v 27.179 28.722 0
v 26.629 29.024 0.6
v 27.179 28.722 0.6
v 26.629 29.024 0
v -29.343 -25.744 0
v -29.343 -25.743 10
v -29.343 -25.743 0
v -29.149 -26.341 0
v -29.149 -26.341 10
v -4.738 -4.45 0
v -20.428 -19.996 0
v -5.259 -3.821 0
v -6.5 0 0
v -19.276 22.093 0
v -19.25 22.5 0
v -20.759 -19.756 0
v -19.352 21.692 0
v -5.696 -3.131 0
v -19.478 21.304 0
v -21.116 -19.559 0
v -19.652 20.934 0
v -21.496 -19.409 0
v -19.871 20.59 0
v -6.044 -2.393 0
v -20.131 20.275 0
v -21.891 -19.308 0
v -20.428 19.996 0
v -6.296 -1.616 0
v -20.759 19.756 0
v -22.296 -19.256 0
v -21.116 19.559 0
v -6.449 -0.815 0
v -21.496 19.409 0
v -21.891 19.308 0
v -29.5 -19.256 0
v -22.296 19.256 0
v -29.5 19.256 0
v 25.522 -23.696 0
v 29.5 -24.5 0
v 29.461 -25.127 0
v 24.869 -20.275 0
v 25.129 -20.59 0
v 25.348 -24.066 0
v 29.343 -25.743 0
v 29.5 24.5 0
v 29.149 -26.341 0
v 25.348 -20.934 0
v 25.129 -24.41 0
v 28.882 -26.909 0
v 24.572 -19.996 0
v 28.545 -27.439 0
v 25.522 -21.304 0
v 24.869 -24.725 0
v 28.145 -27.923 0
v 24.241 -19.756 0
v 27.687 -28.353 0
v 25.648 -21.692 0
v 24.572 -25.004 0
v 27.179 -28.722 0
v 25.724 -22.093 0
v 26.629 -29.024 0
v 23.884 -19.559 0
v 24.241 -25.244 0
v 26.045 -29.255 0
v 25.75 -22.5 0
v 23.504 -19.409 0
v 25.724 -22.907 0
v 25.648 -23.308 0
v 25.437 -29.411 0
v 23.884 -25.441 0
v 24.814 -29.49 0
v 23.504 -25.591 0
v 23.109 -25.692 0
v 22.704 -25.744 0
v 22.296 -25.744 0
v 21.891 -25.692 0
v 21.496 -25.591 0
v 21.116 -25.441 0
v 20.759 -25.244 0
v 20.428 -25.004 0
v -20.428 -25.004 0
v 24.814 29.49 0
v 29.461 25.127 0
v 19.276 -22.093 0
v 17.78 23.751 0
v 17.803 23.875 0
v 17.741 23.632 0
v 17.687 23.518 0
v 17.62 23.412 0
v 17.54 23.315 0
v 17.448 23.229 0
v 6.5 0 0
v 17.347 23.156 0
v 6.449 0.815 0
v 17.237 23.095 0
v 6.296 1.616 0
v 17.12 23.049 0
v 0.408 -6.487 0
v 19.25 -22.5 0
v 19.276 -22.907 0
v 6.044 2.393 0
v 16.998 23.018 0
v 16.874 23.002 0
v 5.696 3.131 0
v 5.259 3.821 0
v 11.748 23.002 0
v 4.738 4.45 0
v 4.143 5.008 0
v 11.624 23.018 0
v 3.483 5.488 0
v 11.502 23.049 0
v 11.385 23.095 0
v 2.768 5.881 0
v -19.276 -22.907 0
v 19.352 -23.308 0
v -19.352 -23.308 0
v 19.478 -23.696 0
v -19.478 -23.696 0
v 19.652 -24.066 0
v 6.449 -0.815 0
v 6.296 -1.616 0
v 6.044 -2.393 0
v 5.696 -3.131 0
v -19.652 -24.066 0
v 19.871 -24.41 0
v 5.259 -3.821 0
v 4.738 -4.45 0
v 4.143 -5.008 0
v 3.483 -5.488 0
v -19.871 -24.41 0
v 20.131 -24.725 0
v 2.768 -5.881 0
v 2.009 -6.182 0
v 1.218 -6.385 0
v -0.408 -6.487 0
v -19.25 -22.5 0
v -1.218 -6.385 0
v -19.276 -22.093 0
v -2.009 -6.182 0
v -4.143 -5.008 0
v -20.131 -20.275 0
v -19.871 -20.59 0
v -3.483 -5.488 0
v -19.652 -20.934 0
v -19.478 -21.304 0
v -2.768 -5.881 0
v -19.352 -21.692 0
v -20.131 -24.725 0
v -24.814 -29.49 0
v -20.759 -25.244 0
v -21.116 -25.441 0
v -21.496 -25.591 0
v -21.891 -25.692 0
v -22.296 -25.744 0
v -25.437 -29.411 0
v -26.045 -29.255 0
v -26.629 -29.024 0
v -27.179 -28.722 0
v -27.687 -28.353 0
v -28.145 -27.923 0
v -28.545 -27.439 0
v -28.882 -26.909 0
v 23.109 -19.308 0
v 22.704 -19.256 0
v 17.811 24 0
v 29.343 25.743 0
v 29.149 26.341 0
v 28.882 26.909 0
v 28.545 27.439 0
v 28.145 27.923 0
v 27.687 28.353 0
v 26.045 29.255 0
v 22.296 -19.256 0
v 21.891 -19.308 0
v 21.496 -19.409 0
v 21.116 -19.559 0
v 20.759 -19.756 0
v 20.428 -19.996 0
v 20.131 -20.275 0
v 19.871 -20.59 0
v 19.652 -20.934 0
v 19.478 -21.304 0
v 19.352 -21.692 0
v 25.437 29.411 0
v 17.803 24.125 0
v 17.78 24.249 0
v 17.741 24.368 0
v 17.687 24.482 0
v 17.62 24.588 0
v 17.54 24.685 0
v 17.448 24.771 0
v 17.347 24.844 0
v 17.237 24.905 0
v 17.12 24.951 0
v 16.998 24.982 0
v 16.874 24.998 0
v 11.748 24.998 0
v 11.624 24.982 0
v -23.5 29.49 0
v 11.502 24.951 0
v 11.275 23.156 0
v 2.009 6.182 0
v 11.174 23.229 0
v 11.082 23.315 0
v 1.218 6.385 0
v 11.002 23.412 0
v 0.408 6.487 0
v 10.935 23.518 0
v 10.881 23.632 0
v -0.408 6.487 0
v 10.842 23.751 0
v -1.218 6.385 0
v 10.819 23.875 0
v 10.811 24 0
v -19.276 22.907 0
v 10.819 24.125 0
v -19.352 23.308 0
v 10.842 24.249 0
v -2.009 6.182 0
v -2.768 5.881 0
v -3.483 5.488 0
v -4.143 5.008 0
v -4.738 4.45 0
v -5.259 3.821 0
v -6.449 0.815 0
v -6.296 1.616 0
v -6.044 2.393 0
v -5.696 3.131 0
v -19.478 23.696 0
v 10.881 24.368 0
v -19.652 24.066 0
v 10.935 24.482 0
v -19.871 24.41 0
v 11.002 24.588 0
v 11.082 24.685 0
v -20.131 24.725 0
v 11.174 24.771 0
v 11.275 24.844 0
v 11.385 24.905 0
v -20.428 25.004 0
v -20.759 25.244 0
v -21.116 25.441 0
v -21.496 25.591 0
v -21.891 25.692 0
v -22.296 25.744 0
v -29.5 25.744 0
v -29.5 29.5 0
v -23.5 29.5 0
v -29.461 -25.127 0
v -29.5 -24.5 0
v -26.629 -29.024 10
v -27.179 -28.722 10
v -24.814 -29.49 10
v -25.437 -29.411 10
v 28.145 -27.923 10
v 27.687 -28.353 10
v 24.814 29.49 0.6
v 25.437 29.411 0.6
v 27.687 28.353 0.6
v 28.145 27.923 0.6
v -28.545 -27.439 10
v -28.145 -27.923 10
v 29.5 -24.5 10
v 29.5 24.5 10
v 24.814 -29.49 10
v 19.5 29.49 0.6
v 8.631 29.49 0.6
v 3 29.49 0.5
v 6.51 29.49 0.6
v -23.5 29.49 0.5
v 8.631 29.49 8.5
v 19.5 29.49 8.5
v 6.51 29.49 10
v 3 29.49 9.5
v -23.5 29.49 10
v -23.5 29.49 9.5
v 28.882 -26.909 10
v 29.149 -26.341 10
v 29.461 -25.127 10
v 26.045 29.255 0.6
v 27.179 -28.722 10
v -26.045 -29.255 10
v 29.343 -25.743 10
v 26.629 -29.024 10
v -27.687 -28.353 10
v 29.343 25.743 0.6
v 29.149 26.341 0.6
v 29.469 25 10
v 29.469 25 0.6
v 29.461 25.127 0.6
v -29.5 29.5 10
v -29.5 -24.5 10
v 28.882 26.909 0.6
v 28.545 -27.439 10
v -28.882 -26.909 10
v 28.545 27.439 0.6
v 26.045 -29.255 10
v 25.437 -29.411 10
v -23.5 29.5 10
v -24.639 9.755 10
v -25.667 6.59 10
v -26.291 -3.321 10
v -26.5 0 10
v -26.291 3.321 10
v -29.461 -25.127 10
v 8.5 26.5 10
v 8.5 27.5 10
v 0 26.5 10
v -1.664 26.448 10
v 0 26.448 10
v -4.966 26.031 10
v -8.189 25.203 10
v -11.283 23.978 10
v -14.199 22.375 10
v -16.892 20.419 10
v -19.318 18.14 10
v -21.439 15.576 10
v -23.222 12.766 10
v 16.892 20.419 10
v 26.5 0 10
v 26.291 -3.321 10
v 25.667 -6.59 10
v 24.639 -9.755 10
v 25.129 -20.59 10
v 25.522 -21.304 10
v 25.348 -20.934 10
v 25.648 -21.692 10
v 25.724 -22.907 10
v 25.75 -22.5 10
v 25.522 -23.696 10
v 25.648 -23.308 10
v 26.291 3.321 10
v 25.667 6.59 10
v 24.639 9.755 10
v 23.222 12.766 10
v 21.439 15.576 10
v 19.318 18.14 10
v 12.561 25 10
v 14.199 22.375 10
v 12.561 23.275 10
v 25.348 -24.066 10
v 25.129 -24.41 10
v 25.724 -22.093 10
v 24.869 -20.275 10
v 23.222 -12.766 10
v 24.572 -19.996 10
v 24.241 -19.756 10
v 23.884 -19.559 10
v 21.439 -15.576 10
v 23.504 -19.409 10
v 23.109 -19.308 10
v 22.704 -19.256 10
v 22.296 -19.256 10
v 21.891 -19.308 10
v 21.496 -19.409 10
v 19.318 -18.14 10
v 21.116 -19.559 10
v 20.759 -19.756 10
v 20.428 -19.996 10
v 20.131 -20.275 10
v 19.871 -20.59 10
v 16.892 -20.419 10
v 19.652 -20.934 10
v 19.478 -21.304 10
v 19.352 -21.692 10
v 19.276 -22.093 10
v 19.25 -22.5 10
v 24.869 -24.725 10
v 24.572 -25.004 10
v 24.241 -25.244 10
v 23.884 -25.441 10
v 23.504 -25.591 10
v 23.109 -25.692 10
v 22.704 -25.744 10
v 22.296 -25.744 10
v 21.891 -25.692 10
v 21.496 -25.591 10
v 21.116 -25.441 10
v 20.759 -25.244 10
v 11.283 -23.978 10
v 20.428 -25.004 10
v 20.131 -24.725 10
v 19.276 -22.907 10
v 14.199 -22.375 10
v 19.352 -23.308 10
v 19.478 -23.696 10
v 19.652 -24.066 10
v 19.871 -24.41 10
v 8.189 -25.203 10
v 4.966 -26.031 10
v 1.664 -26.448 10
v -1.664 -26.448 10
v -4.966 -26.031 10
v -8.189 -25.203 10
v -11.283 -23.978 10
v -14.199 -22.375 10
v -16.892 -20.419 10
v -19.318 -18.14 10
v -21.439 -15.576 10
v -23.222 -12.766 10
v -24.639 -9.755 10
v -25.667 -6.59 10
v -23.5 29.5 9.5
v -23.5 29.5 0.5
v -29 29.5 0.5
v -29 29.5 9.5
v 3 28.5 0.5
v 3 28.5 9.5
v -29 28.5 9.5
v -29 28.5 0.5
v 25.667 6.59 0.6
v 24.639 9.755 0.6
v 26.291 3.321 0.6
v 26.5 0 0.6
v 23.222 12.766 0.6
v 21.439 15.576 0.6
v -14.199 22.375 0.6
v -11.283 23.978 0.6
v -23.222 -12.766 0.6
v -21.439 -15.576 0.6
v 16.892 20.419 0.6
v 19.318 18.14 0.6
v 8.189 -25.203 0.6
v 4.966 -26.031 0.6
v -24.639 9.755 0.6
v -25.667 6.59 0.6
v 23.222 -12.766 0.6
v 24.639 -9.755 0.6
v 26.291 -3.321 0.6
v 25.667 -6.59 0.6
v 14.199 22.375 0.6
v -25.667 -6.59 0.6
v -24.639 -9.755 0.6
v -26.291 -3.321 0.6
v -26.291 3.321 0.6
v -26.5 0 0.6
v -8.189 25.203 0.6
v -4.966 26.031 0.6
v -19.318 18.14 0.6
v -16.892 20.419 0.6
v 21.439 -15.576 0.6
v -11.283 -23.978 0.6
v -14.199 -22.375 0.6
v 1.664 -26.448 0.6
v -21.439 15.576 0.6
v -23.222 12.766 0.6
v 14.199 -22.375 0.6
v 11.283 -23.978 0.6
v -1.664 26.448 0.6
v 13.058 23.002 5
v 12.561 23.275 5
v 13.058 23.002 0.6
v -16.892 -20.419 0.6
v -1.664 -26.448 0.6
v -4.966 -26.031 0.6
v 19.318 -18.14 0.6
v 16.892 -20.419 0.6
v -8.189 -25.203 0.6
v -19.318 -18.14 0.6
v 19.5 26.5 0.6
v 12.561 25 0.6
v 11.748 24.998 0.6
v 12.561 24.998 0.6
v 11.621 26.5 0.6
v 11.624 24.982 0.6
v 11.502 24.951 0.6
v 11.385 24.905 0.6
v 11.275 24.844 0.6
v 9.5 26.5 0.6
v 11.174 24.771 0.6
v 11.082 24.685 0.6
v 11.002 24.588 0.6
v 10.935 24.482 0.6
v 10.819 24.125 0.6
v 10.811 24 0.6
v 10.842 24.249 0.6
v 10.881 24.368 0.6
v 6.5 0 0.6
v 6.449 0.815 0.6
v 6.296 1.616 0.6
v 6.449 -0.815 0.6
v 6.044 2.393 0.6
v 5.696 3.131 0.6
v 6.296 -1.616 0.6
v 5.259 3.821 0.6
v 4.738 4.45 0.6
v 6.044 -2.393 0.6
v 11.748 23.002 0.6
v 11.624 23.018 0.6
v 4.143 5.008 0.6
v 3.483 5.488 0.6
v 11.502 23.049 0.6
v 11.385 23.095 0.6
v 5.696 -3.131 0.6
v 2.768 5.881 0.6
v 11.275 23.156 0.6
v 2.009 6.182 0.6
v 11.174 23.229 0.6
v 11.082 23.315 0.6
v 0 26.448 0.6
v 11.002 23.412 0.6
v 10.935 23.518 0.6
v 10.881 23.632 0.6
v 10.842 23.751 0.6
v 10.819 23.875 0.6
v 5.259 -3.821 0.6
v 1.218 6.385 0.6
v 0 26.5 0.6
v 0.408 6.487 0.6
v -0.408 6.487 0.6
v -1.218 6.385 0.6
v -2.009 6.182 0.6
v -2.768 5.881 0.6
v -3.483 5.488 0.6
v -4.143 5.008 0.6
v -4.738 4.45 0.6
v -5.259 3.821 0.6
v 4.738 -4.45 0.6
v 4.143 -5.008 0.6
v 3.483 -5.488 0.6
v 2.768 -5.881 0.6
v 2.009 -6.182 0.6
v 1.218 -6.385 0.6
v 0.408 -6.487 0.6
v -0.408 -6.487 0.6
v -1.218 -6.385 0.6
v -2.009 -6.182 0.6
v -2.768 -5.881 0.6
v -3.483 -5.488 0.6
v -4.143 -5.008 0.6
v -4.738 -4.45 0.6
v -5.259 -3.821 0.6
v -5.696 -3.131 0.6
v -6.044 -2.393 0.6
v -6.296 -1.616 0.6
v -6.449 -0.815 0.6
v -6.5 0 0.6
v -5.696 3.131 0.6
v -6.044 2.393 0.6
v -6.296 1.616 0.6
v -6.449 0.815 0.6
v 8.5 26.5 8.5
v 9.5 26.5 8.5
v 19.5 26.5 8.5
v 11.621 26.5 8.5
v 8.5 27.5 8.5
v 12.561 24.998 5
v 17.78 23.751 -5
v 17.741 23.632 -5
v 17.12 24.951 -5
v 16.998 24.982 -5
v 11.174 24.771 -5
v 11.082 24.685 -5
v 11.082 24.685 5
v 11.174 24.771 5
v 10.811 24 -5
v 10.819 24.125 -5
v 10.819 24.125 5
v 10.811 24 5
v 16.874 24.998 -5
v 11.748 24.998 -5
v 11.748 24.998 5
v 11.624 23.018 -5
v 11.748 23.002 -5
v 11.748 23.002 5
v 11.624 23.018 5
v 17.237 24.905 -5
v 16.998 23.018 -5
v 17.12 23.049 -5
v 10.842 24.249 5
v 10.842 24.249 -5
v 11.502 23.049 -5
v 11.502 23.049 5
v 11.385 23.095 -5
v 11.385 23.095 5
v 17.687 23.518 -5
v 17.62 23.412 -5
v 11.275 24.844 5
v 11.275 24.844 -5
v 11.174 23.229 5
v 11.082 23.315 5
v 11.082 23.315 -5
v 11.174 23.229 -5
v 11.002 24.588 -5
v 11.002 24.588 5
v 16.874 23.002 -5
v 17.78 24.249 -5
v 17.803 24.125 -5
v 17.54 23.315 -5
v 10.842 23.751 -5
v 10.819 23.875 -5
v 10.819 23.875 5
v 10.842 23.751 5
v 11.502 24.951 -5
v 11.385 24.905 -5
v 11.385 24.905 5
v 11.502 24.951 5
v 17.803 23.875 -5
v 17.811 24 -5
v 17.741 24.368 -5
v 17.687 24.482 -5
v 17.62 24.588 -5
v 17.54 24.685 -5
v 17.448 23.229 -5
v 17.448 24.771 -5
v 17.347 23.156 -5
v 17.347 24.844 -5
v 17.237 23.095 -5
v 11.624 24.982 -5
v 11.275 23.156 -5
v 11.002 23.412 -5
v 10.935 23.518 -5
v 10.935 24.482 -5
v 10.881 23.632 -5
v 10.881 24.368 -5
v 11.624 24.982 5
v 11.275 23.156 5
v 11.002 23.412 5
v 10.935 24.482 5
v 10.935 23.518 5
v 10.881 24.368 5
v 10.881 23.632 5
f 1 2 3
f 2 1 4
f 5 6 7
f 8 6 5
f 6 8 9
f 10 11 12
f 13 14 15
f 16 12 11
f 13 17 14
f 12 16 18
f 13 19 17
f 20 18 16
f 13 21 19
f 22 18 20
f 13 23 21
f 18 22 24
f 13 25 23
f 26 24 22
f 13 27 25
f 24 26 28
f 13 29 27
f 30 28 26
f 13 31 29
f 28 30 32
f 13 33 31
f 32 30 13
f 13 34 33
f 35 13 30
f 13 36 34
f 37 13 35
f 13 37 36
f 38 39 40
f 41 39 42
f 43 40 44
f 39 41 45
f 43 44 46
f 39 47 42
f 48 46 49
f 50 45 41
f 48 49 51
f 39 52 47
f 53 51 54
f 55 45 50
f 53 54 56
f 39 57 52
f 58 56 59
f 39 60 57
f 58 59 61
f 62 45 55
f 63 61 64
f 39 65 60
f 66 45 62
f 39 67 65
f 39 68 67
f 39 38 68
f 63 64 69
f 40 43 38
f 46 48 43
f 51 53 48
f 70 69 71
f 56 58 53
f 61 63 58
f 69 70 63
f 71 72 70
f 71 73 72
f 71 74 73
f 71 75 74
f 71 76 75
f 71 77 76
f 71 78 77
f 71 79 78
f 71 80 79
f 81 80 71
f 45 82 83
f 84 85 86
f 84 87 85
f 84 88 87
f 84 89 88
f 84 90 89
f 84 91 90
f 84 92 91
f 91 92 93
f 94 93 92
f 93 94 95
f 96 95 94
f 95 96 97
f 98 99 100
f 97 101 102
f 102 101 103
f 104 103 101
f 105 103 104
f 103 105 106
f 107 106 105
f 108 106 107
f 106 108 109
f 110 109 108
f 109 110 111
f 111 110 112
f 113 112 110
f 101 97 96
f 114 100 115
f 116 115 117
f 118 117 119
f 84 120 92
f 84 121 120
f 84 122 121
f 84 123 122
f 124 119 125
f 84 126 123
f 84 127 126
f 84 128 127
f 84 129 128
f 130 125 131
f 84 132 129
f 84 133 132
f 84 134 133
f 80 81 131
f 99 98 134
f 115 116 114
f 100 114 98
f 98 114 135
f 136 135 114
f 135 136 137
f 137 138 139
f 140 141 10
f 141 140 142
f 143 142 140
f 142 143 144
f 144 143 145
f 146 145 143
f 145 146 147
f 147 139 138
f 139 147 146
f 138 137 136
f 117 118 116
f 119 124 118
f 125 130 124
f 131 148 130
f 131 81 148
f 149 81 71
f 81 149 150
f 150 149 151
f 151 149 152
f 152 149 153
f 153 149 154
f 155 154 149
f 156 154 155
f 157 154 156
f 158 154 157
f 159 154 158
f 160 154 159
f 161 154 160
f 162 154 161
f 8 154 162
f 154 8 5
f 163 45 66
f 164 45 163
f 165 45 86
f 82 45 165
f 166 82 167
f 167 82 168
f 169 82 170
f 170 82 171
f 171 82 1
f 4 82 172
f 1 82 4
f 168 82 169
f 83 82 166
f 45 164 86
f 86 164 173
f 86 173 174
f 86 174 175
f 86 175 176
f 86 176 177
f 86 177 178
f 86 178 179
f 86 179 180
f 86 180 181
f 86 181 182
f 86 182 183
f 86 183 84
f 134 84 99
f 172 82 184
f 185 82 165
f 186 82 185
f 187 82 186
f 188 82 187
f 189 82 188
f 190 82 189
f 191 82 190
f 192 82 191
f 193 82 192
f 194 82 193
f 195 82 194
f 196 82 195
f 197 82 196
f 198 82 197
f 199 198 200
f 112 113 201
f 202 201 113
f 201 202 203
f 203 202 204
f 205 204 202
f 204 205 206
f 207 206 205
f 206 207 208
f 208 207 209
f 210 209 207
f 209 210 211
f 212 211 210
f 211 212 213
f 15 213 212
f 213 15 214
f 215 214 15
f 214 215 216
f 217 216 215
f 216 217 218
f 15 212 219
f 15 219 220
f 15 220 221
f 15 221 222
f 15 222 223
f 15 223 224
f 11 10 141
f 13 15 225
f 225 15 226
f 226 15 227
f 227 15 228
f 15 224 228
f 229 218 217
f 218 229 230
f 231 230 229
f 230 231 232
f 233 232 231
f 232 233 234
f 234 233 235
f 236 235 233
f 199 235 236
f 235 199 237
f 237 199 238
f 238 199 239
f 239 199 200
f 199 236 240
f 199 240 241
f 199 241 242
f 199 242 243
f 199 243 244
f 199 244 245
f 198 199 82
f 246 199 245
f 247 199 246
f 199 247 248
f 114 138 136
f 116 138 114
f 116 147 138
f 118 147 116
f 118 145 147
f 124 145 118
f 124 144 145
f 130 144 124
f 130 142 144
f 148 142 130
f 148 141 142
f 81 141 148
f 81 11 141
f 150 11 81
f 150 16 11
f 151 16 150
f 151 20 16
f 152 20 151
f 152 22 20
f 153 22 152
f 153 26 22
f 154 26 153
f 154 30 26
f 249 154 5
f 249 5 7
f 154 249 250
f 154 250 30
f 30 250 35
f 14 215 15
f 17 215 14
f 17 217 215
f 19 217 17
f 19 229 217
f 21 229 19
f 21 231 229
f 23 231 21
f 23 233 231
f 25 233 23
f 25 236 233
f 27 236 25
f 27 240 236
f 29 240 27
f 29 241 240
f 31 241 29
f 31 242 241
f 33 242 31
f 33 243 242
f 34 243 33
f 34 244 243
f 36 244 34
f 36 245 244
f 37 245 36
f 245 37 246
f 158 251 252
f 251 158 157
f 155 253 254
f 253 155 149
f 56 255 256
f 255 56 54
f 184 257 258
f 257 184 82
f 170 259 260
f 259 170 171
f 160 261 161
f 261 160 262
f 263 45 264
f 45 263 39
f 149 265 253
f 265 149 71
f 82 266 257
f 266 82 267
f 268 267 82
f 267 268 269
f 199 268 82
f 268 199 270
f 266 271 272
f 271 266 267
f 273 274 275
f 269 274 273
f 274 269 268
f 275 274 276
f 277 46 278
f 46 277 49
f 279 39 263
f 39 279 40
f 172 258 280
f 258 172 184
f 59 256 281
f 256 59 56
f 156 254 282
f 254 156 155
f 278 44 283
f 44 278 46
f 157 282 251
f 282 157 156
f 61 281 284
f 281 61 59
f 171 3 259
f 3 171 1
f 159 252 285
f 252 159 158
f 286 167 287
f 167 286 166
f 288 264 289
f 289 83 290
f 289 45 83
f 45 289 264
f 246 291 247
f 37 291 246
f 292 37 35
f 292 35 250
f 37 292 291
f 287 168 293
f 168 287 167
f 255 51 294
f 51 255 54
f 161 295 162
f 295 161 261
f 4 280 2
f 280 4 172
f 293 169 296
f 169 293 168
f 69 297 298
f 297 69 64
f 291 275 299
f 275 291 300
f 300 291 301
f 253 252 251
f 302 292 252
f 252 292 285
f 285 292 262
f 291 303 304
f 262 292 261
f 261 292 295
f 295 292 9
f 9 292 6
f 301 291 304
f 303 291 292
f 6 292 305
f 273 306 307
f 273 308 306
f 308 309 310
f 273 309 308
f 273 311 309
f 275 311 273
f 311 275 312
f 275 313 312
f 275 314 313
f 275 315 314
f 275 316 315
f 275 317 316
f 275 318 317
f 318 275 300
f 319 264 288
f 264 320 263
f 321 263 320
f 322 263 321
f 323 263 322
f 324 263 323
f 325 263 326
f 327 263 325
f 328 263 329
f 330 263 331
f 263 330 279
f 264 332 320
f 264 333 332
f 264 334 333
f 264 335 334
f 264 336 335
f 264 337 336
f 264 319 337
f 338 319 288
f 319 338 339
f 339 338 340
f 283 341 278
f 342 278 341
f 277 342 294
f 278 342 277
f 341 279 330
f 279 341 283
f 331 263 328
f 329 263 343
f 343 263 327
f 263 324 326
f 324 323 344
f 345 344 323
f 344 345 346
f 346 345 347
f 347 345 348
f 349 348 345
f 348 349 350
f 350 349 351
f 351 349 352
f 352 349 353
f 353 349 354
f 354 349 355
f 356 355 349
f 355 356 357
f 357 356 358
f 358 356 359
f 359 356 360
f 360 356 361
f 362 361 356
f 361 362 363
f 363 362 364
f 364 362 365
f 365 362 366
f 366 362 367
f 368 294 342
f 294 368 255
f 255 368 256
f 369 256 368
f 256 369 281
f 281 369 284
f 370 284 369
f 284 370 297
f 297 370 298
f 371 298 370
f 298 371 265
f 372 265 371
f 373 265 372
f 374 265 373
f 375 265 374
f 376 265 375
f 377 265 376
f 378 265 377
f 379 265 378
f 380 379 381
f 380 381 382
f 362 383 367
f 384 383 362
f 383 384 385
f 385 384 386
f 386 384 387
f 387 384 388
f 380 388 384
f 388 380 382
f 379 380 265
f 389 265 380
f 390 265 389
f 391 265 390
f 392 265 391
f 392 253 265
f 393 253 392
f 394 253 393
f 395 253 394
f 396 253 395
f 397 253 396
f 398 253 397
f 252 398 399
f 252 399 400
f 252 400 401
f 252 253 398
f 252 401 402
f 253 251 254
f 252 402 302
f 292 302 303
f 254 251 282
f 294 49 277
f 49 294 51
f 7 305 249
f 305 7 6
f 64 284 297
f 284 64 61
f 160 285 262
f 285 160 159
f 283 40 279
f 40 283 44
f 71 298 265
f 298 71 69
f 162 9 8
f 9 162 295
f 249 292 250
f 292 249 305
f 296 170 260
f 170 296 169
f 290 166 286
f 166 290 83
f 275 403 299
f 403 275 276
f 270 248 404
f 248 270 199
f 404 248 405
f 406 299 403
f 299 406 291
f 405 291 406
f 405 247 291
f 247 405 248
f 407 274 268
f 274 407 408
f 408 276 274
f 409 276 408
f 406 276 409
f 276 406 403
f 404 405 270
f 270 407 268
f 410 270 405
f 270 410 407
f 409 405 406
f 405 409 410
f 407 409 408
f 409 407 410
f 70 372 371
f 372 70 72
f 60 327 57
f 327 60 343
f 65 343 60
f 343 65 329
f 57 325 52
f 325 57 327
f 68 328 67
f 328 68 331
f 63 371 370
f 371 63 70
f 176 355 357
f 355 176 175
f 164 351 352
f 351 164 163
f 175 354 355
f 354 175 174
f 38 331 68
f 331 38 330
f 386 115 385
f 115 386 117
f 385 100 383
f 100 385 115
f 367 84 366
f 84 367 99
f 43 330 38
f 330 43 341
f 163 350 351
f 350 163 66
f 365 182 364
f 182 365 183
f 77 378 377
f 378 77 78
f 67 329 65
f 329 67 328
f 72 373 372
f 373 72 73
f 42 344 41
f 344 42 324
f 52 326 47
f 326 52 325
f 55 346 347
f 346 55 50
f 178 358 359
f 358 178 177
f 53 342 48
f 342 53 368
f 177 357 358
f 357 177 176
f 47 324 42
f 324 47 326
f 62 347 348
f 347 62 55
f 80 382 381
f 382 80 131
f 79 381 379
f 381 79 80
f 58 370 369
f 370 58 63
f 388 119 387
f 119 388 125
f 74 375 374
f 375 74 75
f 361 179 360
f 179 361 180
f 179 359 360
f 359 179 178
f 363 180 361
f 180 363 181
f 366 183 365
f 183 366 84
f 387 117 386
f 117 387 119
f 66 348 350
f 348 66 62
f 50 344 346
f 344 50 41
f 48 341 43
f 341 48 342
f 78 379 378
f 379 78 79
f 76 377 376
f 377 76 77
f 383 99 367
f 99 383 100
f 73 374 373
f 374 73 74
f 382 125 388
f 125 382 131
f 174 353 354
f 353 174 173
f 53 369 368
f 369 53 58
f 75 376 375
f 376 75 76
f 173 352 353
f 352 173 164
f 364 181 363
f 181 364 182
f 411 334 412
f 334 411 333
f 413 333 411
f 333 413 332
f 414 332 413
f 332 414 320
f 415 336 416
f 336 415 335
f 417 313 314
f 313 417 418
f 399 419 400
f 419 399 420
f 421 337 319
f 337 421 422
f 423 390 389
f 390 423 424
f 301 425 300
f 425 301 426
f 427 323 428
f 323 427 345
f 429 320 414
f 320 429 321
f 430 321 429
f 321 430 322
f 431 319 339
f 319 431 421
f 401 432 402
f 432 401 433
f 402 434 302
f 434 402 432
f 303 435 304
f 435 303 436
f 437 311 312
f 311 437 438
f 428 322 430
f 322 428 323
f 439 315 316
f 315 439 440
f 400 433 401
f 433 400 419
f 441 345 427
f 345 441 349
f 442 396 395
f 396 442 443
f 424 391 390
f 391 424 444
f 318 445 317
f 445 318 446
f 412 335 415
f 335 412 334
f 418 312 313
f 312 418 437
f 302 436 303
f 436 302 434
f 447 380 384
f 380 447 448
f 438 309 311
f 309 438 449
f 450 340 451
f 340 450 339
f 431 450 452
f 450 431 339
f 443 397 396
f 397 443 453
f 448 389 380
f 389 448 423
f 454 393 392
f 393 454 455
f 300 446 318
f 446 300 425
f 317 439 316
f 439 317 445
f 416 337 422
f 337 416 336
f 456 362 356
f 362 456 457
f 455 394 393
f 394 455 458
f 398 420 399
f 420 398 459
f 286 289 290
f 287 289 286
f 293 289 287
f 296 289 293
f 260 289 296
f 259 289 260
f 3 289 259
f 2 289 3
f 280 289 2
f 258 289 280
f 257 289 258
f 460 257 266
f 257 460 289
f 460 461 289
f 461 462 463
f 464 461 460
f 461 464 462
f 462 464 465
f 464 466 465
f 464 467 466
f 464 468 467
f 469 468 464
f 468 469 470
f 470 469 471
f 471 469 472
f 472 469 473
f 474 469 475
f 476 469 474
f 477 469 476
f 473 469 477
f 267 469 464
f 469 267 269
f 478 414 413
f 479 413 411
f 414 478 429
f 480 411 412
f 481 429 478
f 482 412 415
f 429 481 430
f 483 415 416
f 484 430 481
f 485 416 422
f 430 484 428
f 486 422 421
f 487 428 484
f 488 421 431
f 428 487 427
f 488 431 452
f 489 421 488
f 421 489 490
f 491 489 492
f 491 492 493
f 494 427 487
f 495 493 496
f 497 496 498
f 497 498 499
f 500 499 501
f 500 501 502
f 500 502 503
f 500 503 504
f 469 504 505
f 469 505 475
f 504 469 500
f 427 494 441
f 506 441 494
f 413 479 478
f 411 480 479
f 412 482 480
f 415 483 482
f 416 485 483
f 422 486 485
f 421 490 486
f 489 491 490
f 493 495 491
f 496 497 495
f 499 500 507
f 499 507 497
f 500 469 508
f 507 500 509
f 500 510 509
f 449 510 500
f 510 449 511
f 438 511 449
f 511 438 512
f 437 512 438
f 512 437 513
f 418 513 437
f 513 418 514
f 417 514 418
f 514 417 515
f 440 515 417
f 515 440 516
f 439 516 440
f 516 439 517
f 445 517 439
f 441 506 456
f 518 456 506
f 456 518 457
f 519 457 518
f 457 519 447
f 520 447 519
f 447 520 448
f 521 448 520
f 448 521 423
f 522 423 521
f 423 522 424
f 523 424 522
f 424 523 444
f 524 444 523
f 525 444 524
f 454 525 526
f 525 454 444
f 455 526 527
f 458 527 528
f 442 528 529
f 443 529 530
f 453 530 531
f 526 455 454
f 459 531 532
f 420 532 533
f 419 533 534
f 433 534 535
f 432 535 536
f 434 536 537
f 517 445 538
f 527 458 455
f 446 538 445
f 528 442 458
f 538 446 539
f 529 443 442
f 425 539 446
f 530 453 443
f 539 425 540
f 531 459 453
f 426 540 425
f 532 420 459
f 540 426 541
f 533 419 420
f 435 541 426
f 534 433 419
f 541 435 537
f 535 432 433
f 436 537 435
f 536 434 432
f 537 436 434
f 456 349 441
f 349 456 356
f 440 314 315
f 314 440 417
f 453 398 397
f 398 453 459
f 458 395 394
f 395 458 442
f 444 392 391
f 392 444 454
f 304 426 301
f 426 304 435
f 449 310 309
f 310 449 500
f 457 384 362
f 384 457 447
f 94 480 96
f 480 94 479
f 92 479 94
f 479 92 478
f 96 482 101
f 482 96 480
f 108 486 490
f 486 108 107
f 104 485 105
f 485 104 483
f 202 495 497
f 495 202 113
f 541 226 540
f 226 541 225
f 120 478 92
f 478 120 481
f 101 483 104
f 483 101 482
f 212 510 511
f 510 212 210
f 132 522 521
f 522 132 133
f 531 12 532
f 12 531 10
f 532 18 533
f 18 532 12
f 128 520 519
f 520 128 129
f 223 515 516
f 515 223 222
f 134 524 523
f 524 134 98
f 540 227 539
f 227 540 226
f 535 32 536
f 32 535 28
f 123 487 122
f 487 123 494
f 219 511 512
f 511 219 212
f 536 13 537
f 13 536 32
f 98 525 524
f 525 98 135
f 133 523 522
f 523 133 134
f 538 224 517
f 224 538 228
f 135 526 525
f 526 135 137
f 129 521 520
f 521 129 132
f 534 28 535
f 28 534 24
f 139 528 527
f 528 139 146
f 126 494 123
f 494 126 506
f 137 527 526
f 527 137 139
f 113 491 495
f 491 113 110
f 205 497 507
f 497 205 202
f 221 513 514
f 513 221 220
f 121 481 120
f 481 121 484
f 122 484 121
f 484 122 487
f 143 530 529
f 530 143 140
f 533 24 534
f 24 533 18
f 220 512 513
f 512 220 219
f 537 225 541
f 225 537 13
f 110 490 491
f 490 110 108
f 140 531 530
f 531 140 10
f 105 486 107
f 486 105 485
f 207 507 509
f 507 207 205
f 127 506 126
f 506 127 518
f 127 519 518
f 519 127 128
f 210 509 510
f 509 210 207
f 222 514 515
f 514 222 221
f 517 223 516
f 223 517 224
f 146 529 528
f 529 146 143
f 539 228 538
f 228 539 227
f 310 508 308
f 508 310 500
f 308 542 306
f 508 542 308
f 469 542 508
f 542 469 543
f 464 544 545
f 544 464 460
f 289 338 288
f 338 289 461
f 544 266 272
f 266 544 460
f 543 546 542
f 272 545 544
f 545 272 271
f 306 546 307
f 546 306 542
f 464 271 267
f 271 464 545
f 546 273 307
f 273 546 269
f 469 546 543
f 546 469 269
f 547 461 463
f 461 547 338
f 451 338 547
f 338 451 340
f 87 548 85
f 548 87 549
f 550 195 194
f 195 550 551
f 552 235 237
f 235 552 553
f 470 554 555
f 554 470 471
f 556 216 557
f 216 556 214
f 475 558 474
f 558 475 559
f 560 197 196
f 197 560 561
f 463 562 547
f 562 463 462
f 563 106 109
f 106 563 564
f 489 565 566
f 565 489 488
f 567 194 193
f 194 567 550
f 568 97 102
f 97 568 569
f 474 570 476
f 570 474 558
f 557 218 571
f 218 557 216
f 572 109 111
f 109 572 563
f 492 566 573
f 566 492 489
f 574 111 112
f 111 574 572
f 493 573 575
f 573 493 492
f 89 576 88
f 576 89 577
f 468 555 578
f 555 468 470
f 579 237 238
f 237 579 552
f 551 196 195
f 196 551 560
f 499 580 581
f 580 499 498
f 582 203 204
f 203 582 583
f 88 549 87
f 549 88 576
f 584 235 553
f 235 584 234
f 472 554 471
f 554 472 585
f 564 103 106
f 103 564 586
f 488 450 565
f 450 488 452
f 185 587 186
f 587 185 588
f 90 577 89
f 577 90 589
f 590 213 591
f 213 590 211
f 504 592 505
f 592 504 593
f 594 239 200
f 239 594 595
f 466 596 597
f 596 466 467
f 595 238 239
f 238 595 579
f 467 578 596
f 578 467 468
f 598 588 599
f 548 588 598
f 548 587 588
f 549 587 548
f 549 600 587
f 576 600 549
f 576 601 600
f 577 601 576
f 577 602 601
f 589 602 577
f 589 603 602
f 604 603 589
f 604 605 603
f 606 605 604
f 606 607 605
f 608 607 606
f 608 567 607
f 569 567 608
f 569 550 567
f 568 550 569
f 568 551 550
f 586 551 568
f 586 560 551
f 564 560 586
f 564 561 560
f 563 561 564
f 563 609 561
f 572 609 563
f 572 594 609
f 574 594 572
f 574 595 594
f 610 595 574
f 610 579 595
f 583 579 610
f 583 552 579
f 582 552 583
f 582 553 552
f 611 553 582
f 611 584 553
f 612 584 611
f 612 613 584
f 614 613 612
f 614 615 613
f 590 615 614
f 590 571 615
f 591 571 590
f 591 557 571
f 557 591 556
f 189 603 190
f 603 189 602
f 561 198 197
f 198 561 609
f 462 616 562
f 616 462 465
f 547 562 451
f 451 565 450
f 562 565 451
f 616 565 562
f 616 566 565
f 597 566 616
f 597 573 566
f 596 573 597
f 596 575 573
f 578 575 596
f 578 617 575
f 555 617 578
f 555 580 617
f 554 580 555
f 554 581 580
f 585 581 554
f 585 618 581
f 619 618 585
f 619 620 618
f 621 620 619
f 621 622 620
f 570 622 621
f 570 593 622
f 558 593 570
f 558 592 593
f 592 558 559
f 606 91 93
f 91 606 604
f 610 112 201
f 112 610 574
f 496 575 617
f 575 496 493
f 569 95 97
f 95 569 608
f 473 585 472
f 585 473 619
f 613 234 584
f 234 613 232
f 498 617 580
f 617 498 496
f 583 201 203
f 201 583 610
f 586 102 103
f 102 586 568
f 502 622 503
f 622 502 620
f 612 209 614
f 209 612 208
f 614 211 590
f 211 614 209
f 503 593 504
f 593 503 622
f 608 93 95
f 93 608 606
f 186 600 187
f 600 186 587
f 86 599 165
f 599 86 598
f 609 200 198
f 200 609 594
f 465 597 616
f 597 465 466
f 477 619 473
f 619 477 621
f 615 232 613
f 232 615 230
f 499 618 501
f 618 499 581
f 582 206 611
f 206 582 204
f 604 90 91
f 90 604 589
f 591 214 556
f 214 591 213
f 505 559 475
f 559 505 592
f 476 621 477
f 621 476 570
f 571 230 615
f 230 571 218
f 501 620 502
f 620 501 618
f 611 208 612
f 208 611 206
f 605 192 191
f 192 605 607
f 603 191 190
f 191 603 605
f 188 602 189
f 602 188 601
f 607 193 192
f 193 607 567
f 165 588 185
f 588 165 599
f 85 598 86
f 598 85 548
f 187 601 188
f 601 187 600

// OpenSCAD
$fn = 50;


union() {
	difference() {
		union() {
			hull() {
				translate(v = [-24.5000000000, 24.5000000000, 0]) {
					cylinder(h = 10, r = 5);
				}
				translate(v = [24.5000000000, 24.5000000000, 0]) {
					cylinder(h = 10, r = 5);
				}
				translate(v = [-24.5000000000, -24.5000000000, 0]) {
					cylinder(h = 10, r = 5);
				}
				translate(v = [24.5000000000, -24.5000000000, 0]) {
					cylinder(h = 10, r = 5);
				}
			}
			translate(v = [-29.5000000000, 23.5000000000, 0]) {
				cube(size = [6, 6, 10]);
			}
		}
		union() {
			translate(v = [-30.0000000000, -22.5000000000, -250.0000000000]) {
				rotate(a = [0, 0, 0]) {
					difference() {
						union() {
							hull() {
								translate(v = [7.5000000000, 0, 0]) {
									cylinder(h = 250, r = 3.2500000000, r1 = 3.2500000000, r2 = 3.2500000000);
								}
								translate(v = [-7.5000000000, 0, 0]) {
									cylinder(h = 250, r = 3.2500000000, r1 = 3.2500000000, r2 = 3.2500000000);
								}
							}
						}
						union();
					}
				}
			}
			translate(v = [-30.0000000000, 22.5000000000, -250.0000000000]) {
				rotate(a = [0, 0, 0]) {
					difference() {
						union() {
							hull() {
								translate(v = [7.5000000000, 0, 0]) {
									cylinder(h = 250, r = 3.2500000000, r1 = 3.2500000000, r2 = 3.2500000000);
								}
								translate(v = [-7.5000000000, 0, 0]) {
									cylinder(h = 250, r = 3.2500000000, r1 = 3.2500000000, r2 = 3.2500000000);
								}
							}
						}
						union();
					}
				}
			}
			translate(v = [-29.0000000000, 28.5000000000, 0.5000000000]) {
				cube(size = [32, 1, 9.0000000000]);
			}
			translate(v = [22.5000000000, -22.5000000000, 0]) {
				cylinder(h = 100, r = 3.2500000000);
			}
			translate(v = [0, 0, 0.6000000000]) {
				cylinder(h = 12.4000000000, r = 26.5000000000);
			}
			translate(v = [0, 0, -5.0000000000]) {
				cylinder(h = 10, r = 6.5000000000);
			}
			translate(v = [0.0000000000, 25.0000000000, 0.6000000000]) {
				cube(size = [29.5000000000, 1.5000000000, 12.4000000000]);
			}
			translate(v = [19.5000000000, 25.0000000000, 0.6000000000]) {
				cube(size = [10, 4.5000000000, 12.4000000000]);
			}
			translate(v = [8.5000000000, 25.0000000000, 8.5000000000]) {
				cube(size = [21, 4.5000000000, 1.5000000000]);
			}
			translate(v = [5.7500000000, 30.2500000000, 0.6000000000]) {
				rotate(a = [0, 0, -45]) {
					cube(size = [7.5000000000, 1.5000000000, 12.4000000000]);
				}
			}
			translate(v = [5.0610000000, 23.0000000000, 0.6000000000]) {
				cube(size = [7.5000000000, 2, 9.4000000000]);
			}
		}
	}
	union() {
		translate(v = [14.3110000000, 24.0000000000, -5.0000000000]) {
			rotate(a = [0, 0, 0]) {
				difference() {
					union() {
						#hull() {
							#translate(v = [2.5000000000, 0, 0]) {
								cylinder(h = 10, r = 1.0000000000, r1 = 1.0000000000, r2 = 1.0000000000);
							}
							#translate(v = [-2.5000000000, 0, 0]) {
								cylinder(h = 10, r = 1.0000000000, r1 = 1.0000000000, r2 = 1.0000000000);
							}
						}
					}
					union();
				}
			}
		}
	}
}
